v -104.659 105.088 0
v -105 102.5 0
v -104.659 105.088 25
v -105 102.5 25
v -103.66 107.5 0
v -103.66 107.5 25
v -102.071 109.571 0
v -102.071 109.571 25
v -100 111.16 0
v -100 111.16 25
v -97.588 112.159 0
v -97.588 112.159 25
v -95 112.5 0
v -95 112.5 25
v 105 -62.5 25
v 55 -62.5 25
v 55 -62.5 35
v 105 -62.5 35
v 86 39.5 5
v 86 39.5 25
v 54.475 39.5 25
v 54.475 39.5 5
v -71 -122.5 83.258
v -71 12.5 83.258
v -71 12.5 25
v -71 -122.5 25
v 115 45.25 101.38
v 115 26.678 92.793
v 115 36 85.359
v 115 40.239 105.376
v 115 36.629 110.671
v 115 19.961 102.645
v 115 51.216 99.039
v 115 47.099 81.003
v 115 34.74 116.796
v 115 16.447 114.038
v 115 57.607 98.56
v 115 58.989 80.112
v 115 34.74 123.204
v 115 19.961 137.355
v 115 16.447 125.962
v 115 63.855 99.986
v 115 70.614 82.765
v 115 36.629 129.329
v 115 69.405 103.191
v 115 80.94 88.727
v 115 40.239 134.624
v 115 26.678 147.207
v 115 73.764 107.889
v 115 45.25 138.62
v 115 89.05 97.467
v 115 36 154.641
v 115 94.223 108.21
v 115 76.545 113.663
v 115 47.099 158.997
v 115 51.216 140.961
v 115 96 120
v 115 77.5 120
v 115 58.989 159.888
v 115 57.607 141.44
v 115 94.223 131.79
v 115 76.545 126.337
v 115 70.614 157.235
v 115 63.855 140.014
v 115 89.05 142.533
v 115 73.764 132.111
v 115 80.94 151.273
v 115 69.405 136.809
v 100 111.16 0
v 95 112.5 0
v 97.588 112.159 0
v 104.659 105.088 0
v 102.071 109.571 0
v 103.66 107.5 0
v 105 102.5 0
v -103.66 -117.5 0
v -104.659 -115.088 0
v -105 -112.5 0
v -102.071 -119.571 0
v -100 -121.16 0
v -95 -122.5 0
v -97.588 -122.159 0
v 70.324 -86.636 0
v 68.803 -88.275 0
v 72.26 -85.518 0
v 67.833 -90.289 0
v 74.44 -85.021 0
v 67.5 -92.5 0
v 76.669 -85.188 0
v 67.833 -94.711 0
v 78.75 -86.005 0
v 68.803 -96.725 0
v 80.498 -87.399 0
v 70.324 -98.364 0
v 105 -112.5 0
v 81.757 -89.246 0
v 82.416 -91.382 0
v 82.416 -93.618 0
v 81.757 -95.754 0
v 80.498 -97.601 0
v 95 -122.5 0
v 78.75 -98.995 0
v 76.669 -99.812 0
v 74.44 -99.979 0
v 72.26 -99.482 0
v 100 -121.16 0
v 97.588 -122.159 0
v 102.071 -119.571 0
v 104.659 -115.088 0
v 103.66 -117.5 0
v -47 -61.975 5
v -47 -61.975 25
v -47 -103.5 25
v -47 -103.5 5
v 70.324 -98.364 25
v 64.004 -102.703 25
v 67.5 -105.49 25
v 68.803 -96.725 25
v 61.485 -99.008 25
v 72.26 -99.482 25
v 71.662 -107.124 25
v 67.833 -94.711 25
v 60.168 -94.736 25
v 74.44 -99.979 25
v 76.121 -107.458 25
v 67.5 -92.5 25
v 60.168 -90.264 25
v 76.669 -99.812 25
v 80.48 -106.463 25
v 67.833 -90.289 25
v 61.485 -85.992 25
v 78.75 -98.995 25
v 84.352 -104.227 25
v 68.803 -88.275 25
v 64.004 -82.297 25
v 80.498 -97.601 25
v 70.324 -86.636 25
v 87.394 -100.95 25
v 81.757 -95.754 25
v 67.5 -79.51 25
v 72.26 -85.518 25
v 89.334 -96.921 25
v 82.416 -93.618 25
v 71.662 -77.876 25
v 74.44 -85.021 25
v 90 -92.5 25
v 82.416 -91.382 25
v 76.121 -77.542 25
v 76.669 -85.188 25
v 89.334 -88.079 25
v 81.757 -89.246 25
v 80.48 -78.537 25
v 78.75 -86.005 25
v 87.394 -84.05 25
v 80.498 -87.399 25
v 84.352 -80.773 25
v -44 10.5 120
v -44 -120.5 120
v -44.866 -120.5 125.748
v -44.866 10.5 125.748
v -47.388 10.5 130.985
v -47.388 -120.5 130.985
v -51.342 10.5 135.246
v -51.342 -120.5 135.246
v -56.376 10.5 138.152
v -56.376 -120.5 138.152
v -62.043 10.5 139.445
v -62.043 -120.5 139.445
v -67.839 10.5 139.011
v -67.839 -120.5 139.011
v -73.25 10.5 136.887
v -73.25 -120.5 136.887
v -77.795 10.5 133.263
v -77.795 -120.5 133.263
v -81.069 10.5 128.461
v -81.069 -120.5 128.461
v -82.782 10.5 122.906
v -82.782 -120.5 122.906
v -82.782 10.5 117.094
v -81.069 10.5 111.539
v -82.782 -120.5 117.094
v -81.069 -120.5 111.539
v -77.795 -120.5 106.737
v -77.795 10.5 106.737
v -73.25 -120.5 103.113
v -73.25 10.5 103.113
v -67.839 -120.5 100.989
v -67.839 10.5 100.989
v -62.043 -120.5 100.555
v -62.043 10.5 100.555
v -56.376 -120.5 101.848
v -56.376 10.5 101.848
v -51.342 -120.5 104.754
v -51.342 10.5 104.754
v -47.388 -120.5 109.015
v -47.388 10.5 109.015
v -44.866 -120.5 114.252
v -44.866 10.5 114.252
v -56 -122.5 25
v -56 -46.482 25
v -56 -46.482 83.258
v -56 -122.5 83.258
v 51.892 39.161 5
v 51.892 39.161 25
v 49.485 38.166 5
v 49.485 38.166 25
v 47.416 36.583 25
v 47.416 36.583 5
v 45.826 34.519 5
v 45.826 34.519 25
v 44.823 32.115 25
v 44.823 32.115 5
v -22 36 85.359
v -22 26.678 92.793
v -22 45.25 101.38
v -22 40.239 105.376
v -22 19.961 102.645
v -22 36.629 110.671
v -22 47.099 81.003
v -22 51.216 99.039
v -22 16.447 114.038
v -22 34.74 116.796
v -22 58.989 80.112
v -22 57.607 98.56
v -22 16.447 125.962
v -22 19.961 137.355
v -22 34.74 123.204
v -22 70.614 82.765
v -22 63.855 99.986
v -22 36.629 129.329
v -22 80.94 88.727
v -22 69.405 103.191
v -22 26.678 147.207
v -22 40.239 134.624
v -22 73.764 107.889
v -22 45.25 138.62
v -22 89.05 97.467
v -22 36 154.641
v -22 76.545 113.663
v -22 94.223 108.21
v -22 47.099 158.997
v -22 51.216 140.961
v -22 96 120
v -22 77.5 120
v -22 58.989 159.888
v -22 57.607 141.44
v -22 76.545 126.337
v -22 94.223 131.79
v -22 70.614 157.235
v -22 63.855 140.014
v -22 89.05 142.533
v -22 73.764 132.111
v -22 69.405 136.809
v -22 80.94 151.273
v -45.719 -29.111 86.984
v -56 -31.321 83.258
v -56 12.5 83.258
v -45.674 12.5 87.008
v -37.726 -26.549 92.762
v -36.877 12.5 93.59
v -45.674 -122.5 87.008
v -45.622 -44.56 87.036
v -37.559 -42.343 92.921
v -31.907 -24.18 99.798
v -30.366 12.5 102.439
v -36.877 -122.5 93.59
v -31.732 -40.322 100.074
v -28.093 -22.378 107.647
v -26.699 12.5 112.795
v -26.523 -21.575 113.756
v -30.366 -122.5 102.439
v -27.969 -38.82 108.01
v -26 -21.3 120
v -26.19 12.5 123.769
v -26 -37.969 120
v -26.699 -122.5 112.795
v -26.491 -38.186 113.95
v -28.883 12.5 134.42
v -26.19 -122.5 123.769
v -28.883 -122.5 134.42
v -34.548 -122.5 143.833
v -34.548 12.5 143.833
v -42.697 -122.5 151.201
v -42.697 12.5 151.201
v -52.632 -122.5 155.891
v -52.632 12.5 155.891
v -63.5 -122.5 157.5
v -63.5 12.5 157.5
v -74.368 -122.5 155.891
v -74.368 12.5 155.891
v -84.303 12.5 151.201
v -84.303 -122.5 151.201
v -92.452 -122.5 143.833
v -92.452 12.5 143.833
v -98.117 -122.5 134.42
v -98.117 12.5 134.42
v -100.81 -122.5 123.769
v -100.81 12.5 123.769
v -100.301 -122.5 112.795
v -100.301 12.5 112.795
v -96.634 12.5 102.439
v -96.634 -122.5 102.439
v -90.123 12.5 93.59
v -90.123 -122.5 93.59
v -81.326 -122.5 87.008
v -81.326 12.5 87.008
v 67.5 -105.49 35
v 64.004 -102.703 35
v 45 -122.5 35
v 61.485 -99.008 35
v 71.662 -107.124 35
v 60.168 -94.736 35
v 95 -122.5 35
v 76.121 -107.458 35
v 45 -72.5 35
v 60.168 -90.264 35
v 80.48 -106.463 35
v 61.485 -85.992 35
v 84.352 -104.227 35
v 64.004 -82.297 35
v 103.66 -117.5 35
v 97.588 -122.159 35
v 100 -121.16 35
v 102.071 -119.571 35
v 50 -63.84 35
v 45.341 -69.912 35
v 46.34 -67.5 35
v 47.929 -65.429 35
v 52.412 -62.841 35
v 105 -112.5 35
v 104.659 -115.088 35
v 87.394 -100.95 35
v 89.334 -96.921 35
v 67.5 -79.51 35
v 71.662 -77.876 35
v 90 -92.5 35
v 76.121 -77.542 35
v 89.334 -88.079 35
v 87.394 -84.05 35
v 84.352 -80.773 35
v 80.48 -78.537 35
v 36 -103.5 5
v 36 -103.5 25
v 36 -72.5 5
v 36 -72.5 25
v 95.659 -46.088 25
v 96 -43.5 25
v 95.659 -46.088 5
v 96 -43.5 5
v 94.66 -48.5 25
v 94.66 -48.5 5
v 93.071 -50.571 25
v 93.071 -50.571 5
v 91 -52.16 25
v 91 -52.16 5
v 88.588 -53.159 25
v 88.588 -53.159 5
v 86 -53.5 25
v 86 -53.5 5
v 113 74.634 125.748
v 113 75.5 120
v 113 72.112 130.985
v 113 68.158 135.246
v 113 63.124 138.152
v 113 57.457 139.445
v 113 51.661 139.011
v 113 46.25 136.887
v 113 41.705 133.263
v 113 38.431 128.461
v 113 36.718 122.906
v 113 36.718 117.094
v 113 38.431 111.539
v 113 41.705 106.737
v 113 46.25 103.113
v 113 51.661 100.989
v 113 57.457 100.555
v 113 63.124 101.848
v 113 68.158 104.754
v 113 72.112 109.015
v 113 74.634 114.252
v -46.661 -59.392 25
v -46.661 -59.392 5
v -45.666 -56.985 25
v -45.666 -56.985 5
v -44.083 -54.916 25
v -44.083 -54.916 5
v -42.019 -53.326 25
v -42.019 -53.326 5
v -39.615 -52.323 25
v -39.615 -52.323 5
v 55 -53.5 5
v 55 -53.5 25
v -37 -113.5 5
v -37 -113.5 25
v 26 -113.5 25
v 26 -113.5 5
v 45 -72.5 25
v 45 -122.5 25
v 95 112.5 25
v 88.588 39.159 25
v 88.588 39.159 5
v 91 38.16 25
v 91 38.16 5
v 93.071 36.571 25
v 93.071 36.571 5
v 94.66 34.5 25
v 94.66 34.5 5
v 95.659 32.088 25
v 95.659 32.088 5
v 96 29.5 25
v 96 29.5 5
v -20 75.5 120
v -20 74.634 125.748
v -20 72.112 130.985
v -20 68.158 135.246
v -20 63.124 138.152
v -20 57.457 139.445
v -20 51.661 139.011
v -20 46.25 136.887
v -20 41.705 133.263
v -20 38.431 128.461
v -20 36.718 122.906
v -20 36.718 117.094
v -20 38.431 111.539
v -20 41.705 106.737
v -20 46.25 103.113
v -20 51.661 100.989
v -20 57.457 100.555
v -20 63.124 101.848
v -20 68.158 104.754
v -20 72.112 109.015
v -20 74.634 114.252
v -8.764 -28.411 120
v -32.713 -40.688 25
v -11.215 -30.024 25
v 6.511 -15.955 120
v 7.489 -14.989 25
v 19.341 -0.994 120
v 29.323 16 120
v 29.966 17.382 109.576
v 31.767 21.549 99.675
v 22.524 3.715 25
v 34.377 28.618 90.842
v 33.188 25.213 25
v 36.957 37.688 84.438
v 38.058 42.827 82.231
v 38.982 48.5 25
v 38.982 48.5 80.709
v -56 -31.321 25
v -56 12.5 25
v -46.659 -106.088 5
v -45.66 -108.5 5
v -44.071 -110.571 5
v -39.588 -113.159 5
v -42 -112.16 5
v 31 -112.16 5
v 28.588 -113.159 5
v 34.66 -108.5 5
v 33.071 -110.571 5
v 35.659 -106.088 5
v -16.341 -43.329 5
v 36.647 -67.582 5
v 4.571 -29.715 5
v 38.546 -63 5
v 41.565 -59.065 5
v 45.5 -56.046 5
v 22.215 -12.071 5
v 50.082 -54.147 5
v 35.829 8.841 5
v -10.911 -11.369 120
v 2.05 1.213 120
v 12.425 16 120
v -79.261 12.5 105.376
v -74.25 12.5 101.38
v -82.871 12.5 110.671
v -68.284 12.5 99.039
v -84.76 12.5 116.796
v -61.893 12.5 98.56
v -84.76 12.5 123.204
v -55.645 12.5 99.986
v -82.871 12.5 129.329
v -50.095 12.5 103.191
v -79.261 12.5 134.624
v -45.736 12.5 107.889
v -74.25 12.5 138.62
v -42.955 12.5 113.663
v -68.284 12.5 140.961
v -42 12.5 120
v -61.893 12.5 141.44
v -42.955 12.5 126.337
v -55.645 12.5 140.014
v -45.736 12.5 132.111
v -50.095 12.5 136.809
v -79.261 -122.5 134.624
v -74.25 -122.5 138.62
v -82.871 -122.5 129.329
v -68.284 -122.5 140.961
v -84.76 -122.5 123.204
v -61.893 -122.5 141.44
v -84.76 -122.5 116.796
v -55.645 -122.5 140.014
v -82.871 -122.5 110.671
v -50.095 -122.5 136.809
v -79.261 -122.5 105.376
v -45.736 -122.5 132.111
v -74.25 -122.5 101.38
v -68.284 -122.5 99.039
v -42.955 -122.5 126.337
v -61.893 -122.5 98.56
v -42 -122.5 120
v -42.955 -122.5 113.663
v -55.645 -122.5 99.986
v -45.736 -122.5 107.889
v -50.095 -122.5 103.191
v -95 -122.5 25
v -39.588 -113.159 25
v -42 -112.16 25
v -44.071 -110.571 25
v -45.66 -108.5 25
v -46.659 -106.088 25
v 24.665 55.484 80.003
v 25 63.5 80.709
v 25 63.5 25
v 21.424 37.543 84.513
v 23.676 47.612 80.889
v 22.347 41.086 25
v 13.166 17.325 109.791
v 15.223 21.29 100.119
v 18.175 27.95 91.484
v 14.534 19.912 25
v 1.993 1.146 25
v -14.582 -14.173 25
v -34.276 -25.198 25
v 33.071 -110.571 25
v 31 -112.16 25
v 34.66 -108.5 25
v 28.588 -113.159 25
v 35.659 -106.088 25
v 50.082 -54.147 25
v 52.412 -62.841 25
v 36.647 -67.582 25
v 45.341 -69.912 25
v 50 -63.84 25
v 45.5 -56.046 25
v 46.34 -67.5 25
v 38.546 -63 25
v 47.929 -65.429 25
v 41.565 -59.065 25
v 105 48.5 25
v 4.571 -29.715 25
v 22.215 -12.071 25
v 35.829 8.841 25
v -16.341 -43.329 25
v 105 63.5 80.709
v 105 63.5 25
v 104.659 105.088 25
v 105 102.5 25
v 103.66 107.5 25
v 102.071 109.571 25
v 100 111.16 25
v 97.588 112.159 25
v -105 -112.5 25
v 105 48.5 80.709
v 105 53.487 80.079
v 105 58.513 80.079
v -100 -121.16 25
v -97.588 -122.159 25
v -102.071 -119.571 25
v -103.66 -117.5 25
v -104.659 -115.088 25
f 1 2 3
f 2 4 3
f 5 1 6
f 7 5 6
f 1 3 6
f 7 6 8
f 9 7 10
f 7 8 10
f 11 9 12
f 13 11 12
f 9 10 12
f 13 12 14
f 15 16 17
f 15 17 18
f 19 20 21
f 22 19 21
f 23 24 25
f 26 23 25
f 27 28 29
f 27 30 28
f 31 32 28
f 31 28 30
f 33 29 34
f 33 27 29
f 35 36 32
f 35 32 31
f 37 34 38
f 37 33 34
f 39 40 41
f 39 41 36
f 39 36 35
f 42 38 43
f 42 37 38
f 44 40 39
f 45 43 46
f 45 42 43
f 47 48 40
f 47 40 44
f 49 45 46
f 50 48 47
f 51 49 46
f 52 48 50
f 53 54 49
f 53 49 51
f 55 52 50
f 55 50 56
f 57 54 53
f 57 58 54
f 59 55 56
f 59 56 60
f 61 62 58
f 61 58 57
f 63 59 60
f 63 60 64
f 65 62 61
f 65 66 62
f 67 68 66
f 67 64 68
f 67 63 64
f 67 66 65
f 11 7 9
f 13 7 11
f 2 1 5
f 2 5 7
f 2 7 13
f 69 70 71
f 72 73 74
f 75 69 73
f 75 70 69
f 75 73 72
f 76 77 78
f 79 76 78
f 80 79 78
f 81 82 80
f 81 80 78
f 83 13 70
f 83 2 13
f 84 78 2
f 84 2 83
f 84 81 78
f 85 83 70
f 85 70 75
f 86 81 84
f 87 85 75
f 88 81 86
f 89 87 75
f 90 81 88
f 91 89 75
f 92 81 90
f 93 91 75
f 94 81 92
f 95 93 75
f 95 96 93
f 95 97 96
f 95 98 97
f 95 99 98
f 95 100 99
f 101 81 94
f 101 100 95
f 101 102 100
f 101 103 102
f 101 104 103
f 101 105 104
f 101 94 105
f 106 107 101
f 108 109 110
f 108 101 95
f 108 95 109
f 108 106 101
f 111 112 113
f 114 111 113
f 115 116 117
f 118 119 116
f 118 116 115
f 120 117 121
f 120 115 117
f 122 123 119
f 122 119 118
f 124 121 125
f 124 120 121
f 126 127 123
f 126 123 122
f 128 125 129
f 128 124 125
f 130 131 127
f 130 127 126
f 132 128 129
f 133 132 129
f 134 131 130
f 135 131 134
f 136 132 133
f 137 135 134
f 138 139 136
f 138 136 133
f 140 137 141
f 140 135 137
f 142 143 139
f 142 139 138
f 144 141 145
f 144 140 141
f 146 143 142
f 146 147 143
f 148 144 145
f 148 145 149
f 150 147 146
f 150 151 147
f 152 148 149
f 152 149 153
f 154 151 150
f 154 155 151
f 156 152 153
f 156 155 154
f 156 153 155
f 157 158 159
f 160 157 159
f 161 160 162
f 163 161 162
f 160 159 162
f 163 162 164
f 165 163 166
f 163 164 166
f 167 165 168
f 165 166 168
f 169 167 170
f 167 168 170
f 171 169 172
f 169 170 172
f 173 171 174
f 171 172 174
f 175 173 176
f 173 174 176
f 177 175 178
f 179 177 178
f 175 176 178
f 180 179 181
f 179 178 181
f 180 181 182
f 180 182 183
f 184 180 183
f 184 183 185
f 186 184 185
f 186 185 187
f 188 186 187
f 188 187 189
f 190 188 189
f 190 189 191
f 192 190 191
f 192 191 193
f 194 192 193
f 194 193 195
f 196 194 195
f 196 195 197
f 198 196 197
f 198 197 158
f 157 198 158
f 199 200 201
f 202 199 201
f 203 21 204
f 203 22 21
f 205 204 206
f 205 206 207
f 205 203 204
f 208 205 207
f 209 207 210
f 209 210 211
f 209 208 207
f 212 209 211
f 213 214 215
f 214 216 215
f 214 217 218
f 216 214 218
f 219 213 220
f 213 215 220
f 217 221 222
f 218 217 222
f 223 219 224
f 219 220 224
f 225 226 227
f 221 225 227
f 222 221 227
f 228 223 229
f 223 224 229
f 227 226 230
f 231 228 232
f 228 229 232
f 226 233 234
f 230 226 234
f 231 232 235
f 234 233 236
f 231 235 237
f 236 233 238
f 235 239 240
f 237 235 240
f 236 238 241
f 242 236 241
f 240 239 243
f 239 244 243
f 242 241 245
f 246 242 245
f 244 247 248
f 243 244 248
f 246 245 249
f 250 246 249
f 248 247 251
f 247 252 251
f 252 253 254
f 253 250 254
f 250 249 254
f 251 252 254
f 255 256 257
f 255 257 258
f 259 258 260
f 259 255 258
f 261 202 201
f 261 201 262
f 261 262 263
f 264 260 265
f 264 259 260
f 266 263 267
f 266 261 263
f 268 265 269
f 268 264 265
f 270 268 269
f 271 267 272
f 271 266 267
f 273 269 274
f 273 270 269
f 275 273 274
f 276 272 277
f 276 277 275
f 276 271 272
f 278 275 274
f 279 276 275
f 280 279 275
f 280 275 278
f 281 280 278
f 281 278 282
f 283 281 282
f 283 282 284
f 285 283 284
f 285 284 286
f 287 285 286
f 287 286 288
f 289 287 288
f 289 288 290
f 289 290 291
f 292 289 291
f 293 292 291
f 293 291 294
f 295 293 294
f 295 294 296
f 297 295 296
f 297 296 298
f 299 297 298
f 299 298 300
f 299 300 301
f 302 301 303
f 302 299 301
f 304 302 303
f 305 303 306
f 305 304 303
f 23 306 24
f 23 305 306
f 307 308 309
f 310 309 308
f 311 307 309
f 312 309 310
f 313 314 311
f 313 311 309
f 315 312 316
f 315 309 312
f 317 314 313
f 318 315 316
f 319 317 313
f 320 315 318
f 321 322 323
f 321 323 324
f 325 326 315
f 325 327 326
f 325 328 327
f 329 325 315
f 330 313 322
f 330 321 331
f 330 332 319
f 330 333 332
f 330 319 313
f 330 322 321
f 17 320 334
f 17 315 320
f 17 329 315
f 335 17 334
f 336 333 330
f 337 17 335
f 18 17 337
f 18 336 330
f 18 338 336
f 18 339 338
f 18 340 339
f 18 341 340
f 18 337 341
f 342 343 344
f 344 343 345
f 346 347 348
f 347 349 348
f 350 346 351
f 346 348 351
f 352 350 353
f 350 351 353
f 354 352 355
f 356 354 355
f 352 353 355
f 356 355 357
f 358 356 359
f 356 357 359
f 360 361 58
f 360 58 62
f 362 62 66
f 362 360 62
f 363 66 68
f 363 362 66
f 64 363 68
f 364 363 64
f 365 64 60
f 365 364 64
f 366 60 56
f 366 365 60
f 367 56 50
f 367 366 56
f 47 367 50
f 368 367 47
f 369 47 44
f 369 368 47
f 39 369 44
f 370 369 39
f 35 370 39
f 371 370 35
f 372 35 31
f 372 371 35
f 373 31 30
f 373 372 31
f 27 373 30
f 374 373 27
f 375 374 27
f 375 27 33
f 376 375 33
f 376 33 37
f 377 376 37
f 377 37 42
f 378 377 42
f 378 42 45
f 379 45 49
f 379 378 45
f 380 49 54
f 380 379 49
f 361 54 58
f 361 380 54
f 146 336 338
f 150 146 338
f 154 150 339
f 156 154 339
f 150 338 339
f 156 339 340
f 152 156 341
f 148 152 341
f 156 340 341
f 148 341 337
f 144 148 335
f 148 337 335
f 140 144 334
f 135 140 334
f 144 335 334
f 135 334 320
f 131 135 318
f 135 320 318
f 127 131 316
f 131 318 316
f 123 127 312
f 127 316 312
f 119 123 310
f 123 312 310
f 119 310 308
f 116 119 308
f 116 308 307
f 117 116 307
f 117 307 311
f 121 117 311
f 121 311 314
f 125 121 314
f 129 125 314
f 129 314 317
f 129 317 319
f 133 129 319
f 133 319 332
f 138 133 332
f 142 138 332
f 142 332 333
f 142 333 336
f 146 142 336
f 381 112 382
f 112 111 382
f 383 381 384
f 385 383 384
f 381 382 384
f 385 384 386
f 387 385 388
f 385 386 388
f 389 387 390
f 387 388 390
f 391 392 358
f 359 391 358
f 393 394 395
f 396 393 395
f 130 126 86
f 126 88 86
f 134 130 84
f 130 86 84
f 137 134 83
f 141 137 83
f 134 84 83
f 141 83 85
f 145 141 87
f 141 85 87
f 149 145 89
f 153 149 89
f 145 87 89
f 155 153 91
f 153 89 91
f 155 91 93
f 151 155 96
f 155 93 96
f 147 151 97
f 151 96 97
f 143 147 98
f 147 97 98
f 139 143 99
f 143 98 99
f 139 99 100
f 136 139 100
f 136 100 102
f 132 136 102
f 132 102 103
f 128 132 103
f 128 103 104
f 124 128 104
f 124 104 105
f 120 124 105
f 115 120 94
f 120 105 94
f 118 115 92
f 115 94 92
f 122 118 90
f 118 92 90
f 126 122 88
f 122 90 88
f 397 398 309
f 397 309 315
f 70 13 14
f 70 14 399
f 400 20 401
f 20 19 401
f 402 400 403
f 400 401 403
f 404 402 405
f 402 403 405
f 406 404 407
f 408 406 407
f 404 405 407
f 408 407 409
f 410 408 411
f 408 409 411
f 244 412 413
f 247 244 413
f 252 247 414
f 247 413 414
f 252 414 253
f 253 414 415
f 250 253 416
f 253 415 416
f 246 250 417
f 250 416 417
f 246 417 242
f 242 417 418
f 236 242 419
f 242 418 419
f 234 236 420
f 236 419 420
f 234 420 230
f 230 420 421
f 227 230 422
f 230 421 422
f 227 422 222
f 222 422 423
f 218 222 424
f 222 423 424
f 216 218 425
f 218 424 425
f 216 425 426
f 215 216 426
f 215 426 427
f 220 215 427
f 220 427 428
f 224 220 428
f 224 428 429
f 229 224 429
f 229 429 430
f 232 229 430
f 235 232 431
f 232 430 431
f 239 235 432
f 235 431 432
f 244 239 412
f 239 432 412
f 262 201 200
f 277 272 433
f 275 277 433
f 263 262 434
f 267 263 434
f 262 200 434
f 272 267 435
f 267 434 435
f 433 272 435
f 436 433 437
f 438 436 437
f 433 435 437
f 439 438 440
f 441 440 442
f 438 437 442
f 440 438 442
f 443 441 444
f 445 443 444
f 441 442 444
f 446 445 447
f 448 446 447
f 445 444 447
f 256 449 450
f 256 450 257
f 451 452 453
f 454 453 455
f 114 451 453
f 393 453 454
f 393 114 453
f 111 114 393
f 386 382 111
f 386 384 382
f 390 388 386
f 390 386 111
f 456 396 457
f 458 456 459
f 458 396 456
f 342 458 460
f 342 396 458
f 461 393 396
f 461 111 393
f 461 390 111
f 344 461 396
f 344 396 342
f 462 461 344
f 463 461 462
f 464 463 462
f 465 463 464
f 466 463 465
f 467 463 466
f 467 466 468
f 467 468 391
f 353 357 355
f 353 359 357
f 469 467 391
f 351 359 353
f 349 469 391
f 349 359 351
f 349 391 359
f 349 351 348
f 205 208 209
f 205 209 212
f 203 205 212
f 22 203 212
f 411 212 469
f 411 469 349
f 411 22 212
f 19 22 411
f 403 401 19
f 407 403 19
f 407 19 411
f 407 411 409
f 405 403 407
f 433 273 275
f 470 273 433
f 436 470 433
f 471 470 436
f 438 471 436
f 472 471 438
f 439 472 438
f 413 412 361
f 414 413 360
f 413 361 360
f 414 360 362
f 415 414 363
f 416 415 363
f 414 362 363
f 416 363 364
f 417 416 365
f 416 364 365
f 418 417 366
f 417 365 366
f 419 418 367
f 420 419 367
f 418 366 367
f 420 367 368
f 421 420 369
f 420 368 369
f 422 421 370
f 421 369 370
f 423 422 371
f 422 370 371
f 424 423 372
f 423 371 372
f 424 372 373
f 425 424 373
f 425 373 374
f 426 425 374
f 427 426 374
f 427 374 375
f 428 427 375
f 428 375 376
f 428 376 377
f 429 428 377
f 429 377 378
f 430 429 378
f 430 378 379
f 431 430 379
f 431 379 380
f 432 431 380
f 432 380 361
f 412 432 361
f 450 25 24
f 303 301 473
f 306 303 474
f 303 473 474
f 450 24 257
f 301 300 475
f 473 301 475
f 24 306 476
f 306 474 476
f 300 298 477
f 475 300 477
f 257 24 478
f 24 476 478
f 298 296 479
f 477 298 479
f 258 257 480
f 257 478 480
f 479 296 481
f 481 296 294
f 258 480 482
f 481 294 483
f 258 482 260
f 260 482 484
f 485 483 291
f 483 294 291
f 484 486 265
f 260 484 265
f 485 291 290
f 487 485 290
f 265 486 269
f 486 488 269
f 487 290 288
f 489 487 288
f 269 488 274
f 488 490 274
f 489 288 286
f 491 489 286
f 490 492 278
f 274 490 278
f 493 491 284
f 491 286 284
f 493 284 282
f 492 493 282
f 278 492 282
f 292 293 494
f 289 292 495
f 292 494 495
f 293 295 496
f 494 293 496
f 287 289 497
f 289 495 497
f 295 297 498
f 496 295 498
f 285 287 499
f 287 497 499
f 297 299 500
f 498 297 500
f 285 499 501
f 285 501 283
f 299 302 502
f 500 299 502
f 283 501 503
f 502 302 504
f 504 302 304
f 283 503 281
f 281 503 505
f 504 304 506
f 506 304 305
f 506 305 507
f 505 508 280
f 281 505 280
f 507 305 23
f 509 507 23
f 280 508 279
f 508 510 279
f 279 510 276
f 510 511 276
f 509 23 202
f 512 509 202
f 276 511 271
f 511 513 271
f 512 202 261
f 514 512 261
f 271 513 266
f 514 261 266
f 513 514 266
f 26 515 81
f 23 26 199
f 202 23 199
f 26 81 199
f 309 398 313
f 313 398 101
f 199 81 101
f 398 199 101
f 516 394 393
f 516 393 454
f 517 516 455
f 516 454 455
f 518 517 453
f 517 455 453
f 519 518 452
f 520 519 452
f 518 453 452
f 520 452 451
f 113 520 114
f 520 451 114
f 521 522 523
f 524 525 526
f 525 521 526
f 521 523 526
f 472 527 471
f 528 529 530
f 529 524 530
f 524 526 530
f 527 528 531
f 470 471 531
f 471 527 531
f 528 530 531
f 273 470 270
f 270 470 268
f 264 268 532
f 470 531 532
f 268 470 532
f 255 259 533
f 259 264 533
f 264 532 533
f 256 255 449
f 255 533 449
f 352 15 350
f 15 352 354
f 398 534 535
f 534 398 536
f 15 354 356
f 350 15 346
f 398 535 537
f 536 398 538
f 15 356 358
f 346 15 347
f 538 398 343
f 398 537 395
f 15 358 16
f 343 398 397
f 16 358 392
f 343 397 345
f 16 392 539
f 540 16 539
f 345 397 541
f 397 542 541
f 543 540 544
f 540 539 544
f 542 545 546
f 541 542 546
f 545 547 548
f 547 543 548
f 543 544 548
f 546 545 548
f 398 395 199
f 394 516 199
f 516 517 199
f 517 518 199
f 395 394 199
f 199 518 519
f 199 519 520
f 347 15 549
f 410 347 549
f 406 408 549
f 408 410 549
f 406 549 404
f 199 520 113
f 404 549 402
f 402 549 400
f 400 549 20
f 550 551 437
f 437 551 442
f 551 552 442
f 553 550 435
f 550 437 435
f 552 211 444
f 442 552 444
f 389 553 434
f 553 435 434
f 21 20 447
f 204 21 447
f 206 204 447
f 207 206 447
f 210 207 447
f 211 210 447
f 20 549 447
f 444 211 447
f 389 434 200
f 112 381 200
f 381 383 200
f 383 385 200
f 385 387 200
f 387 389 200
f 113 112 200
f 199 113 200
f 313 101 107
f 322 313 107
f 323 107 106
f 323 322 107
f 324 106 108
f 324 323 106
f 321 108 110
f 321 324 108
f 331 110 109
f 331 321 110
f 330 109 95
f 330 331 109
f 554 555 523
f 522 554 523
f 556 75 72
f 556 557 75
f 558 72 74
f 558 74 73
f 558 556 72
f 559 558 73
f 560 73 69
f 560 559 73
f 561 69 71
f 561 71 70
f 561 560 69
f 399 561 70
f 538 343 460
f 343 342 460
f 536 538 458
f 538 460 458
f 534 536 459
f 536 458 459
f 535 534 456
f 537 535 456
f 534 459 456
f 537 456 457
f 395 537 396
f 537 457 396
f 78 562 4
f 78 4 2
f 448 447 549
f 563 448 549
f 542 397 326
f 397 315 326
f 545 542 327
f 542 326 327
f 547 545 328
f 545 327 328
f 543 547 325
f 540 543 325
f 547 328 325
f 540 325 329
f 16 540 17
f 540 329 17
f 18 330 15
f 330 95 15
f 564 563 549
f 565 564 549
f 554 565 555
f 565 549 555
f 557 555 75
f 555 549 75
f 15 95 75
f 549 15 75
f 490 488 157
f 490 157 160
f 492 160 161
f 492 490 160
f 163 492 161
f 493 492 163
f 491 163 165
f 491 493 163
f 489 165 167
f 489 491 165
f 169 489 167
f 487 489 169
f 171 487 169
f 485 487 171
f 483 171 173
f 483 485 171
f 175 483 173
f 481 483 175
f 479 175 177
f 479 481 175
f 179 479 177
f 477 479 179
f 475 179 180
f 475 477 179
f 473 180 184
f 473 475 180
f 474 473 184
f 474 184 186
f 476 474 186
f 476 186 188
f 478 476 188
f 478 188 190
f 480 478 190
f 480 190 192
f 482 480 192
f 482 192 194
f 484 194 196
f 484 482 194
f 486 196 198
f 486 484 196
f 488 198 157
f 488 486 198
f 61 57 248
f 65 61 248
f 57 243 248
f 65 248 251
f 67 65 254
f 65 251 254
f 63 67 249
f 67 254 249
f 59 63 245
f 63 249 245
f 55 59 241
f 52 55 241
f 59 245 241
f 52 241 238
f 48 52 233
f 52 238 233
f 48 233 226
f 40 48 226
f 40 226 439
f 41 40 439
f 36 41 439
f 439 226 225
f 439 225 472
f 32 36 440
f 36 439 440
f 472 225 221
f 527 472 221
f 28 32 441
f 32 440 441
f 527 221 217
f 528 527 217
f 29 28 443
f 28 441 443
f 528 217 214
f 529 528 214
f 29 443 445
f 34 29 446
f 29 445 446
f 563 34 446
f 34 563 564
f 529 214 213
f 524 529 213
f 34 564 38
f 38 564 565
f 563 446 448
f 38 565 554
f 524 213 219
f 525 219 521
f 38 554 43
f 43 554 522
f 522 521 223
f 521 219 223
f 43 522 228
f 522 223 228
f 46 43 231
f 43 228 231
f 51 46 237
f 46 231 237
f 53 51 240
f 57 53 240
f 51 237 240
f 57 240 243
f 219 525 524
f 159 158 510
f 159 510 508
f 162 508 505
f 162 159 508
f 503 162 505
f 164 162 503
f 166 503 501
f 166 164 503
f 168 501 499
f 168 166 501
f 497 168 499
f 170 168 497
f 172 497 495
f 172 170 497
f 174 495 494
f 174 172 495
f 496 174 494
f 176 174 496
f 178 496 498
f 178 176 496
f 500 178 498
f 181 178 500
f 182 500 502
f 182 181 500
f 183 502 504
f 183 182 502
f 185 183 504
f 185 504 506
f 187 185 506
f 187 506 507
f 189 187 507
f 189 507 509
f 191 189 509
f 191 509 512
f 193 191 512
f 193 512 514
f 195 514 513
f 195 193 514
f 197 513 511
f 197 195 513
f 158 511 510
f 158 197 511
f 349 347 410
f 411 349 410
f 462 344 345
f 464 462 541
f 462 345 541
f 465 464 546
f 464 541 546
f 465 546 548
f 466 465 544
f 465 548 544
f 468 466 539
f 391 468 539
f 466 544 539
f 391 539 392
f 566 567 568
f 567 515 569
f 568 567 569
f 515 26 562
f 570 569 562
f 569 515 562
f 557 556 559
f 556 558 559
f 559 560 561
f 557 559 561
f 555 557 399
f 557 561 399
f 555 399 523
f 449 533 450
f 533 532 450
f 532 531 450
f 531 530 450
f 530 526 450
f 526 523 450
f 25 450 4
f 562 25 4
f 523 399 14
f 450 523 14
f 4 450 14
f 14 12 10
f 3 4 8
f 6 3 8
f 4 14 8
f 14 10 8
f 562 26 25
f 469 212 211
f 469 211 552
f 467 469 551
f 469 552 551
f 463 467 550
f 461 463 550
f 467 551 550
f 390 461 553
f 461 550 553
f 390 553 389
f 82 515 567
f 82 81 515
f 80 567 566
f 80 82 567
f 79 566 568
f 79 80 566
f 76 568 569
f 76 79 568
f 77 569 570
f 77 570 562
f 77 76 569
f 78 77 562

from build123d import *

# Parameters (mm, degrees)
F0_W            = 210
F0_H            = 225
F1_DEPTH        = 25
F3_DEPTH        = 95
F4_R            = 37.5
F5_DEPTH        = 10
F5_DEPTH_BACK   = 125
F6_R            = 40
F7_DEPTH        = 10
F7_DEPTH_BACK   = 127
F8_W            = 60
F8_H            = 60
F9_DEPTH        = 10
F10_R           = 10
F12_DEPTH       = 20
F14_D           = 15
F14_CBORE_D     = 30
F14_CBORE_DEPTH = 10
F15_R           = 10
F16_R           = 19.5
F17_DEPTH       = 235.001
F18_R           = 19.5
F19_DEPTH       = 220.001
F20_SIZE        = 2
F21_R           = 10


with BuildPart() as f1:
    # F0 (on Top) → F1 (new body)
    with BuildSketch(Plane.XY):
        Rectangle(F0_W, F0_H)
    extrude(amount=F1_DEPTH)

    # F2 (on face) → F3 (join)
    with BuildSketch(Plane.XY.offset(25)):
        with BuildLine():
            ThreePointArc((25, 63.5), (-3.1177490061, -4.3822509939), (-71, -32.5))
            Line((-71, -32.5), (-71, -112.5))
            Line((-71, -112.5), (-56, -112.5))
            Line((-56, -112.5), (-56, -46.4818166789))
            ThreePointArc((-56, -46.4818166789), (7.4888527117, -14.9888527117), (38.9818166789, 48.5))
            Line((38.9818166789, 48.5), (105, 48.5))
            Line((105, 48.5), (105, 63.5))
            Line((105, 63.5), (25, 63.5))
        make_face()
    extrude(amount=F3_DEPTH)

    # F4 (on face) → F5 (join, two sides)
    with BuildSketch(Plane.XZ.offset(112.5)) as f5_sk:
        with Locations((-63.5, 120)):
            Circle(F4_R)
        with BuildLine():
            ThreePointArc((-56, 83.2576538583), (-63.5, 82.5), (-71, 83.2576538583))
            Line((-71, 83.2576538583), (-71, 25))
            Line((-71, 25), (-105, 25))
            Line((-105, 25), (-105, 0))
            Line((-105, 0), (105, 0))
            Line((105, 0), (105, 25))
            Line((105, 25), (-56, 25))
            Line((-56, 25), (-56, 83.2576538583))
        make_face()
    extrude(amount=F5_DEPTH)
    extrude(f5_sk.sketch, amount=-F5_DEPTH_BACK)

    # F6 (on face) → F7 (join, two sides)
    with BuildSketch(Plane.YZ.offset(105)) as f7_sk:
        with Locations((56, 120)):
            Circle(F6_R)
        with BuildLine():
            ThreePointArc((63.5, 80.7094158862), (86.8220700148, 94.504902432), (96, 120))
            ThreePointArc((96, 120), (30.504902432, 150.8220700148), (48.5, 80.7094158862))
            Line((48.5, 80.7094158862), (48.5, 120))
            Line((48.5, 120), (63.5, 120))
            Line((63.5, 120), (63.5, 80.7094158862))
        make_face()
    extrude(amount=F7_DEPTH)
    extrude(f7_sk.sketch, amount=-F7_DEPTH_BACK)

    # F8 (on face) → F9 (join)
    with BuildSketch(Plane.XY.offset(25)):
        with Locations((75, -92.5)):
            Rectangle(F8_W, F8_H)
    extrude(amount=F9_DEPTH)

    # F10
    f10_edges = [f1.edges().sort_by_distance(p)[0] for p in [
        (45, -62.5, 30),
    ]]
    fillet(f10_edges, radius=F10_R)

    # F11 (on face) → F12 (cut)
    with BuildSketch(Plane.XY.offset(25)):
        with BuildLine():
            ThreePointArc((46.5755076536, 39.5), (13.8528137424, -21.3528137424), (-47, -54.0755076536))
            Line((-47, -54.0755076536), (-47, -113.5))
            Line((-47, -113.5), (36, -113.5))
            Line((36, -113.5), (36, -72.5))
            ThreePointArc((36, -72.5), (41.5649711575, -59.0649711575), (55, -53.5))
            Line((55, -53.5), (96, -53.5))
            Line((96, -53.5), (96, 39.5))
            Line((96, 39.5), (46.5755076536, 39.5))
        make_face()
    extrude(amount=-F12_DEPTH, mode=Mode.SUBTRACT)

    # F14 (through all)
    with Locations(Plane.XY.offset(35)):
        with Locations((75, -92.5)):
            CounterBoreHole(F14_D / 2, F14_CBORE_D / 2, F14_CBORE_DEPTH)

    # F15
    f15_edges = [f1.edges().sort_by_distance(p)[0] for p in [
        (-47, -54.075508, 15),
        (46.575508, 39.5, 15),
        (-47, -113.5, 15),
        (96, 39.5, 15),
        (96, -53.5, 15),
        (36, -113.5, 15),
    ]]
    fillet(f15_edges, radius=F15_R)

    # F16 (on face) → F17 (cut, through all)
    with BuildSketch(Plane.XZ.offset(122.5)):
        with Locations((-63.5, 120)):
            Circle(F16_R)
    extrude(amount=-F17_DEPTH, mode=Mode.SUBTRACT)

    # F18 (on face) → F19 (cut, through all)
    with BuildSketch(Plane.YZ.offset(115)):
        with Locations((56, 120)):
            Circle(F18_R)
    extrude(amount=-F19_DEPTH, mode=Mode.SUBTRACT)

    # F20
    f20_edges = [f1.edges().sort_by_distance(p)[0] for p in [
        (115, 36.5, 120),
        (-83, -122.5, 120),
        (-22, 36.5, 120),
        (-83, 12.5, 120),
    ]]
    chamfer(f20_edges, length=F20_SIZE)

    # F21
    f21_edges = [f1.edges().sort_by_distance(p)[0] for p in [
        (105, 112.5, 12.5),
        (105, -122.5, 17.5),
        (-105, 112.5, 12.5),
        (-105, -122.5, 12.5),
    ]]
    fillet(f21_edges, radius=F21_R)


solid = f1.part
